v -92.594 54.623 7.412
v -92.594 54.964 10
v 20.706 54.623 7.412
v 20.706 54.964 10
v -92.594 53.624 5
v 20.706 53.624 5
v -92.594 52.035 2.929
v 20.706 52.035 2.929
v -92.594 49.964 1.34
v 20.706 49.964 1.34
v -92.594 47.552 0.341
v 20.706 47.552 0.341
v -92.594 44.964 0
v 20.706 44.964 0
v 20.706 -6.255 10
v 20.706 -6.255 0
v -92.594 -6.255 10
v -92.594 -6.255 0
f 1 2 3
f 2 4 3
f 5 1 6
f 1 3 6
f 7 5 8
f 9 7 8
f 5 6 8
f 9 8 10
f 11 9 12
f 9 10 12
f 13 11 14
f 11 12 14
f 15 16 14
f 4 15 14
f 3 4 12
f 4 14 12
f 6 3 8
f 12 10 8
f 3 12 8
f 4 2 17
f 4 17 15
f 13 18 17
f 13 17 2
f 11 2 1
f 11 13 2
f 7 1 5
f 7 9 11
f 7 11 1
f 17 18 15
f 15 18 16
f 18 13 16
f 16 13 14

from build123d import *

# Parameters (mm, degrees)
SKETCH8_W           = 113.299968811
SKETCH8_H           = 61.218531535
BOSS_EXTRUDE6_DEPTH = 10
FILLET7_R           = 10


with BuildPart() as part:
    # Sketch8 → Boss-Extrude6 (new body)
    with BuildSketch(Plane.XY):
        with Locations((-35.943575618, 24.354623855)):
            Rectangle(SKETCH8_W, SKETCH8_H)
    extrude(amount=BOSS_EXTRUDE6_DEPTH)

    # Fillet7
    fillet7_edges = [part.edges().sort_by_distance(p)[0] for p in [
        (-35.943575617, 54.963889622, 0),
    ]]
    fillet(fillet7_edges, radius=FILLET7_R - 0.0001)  # a hair under: the kernel refuses the full size


solid = part.part
